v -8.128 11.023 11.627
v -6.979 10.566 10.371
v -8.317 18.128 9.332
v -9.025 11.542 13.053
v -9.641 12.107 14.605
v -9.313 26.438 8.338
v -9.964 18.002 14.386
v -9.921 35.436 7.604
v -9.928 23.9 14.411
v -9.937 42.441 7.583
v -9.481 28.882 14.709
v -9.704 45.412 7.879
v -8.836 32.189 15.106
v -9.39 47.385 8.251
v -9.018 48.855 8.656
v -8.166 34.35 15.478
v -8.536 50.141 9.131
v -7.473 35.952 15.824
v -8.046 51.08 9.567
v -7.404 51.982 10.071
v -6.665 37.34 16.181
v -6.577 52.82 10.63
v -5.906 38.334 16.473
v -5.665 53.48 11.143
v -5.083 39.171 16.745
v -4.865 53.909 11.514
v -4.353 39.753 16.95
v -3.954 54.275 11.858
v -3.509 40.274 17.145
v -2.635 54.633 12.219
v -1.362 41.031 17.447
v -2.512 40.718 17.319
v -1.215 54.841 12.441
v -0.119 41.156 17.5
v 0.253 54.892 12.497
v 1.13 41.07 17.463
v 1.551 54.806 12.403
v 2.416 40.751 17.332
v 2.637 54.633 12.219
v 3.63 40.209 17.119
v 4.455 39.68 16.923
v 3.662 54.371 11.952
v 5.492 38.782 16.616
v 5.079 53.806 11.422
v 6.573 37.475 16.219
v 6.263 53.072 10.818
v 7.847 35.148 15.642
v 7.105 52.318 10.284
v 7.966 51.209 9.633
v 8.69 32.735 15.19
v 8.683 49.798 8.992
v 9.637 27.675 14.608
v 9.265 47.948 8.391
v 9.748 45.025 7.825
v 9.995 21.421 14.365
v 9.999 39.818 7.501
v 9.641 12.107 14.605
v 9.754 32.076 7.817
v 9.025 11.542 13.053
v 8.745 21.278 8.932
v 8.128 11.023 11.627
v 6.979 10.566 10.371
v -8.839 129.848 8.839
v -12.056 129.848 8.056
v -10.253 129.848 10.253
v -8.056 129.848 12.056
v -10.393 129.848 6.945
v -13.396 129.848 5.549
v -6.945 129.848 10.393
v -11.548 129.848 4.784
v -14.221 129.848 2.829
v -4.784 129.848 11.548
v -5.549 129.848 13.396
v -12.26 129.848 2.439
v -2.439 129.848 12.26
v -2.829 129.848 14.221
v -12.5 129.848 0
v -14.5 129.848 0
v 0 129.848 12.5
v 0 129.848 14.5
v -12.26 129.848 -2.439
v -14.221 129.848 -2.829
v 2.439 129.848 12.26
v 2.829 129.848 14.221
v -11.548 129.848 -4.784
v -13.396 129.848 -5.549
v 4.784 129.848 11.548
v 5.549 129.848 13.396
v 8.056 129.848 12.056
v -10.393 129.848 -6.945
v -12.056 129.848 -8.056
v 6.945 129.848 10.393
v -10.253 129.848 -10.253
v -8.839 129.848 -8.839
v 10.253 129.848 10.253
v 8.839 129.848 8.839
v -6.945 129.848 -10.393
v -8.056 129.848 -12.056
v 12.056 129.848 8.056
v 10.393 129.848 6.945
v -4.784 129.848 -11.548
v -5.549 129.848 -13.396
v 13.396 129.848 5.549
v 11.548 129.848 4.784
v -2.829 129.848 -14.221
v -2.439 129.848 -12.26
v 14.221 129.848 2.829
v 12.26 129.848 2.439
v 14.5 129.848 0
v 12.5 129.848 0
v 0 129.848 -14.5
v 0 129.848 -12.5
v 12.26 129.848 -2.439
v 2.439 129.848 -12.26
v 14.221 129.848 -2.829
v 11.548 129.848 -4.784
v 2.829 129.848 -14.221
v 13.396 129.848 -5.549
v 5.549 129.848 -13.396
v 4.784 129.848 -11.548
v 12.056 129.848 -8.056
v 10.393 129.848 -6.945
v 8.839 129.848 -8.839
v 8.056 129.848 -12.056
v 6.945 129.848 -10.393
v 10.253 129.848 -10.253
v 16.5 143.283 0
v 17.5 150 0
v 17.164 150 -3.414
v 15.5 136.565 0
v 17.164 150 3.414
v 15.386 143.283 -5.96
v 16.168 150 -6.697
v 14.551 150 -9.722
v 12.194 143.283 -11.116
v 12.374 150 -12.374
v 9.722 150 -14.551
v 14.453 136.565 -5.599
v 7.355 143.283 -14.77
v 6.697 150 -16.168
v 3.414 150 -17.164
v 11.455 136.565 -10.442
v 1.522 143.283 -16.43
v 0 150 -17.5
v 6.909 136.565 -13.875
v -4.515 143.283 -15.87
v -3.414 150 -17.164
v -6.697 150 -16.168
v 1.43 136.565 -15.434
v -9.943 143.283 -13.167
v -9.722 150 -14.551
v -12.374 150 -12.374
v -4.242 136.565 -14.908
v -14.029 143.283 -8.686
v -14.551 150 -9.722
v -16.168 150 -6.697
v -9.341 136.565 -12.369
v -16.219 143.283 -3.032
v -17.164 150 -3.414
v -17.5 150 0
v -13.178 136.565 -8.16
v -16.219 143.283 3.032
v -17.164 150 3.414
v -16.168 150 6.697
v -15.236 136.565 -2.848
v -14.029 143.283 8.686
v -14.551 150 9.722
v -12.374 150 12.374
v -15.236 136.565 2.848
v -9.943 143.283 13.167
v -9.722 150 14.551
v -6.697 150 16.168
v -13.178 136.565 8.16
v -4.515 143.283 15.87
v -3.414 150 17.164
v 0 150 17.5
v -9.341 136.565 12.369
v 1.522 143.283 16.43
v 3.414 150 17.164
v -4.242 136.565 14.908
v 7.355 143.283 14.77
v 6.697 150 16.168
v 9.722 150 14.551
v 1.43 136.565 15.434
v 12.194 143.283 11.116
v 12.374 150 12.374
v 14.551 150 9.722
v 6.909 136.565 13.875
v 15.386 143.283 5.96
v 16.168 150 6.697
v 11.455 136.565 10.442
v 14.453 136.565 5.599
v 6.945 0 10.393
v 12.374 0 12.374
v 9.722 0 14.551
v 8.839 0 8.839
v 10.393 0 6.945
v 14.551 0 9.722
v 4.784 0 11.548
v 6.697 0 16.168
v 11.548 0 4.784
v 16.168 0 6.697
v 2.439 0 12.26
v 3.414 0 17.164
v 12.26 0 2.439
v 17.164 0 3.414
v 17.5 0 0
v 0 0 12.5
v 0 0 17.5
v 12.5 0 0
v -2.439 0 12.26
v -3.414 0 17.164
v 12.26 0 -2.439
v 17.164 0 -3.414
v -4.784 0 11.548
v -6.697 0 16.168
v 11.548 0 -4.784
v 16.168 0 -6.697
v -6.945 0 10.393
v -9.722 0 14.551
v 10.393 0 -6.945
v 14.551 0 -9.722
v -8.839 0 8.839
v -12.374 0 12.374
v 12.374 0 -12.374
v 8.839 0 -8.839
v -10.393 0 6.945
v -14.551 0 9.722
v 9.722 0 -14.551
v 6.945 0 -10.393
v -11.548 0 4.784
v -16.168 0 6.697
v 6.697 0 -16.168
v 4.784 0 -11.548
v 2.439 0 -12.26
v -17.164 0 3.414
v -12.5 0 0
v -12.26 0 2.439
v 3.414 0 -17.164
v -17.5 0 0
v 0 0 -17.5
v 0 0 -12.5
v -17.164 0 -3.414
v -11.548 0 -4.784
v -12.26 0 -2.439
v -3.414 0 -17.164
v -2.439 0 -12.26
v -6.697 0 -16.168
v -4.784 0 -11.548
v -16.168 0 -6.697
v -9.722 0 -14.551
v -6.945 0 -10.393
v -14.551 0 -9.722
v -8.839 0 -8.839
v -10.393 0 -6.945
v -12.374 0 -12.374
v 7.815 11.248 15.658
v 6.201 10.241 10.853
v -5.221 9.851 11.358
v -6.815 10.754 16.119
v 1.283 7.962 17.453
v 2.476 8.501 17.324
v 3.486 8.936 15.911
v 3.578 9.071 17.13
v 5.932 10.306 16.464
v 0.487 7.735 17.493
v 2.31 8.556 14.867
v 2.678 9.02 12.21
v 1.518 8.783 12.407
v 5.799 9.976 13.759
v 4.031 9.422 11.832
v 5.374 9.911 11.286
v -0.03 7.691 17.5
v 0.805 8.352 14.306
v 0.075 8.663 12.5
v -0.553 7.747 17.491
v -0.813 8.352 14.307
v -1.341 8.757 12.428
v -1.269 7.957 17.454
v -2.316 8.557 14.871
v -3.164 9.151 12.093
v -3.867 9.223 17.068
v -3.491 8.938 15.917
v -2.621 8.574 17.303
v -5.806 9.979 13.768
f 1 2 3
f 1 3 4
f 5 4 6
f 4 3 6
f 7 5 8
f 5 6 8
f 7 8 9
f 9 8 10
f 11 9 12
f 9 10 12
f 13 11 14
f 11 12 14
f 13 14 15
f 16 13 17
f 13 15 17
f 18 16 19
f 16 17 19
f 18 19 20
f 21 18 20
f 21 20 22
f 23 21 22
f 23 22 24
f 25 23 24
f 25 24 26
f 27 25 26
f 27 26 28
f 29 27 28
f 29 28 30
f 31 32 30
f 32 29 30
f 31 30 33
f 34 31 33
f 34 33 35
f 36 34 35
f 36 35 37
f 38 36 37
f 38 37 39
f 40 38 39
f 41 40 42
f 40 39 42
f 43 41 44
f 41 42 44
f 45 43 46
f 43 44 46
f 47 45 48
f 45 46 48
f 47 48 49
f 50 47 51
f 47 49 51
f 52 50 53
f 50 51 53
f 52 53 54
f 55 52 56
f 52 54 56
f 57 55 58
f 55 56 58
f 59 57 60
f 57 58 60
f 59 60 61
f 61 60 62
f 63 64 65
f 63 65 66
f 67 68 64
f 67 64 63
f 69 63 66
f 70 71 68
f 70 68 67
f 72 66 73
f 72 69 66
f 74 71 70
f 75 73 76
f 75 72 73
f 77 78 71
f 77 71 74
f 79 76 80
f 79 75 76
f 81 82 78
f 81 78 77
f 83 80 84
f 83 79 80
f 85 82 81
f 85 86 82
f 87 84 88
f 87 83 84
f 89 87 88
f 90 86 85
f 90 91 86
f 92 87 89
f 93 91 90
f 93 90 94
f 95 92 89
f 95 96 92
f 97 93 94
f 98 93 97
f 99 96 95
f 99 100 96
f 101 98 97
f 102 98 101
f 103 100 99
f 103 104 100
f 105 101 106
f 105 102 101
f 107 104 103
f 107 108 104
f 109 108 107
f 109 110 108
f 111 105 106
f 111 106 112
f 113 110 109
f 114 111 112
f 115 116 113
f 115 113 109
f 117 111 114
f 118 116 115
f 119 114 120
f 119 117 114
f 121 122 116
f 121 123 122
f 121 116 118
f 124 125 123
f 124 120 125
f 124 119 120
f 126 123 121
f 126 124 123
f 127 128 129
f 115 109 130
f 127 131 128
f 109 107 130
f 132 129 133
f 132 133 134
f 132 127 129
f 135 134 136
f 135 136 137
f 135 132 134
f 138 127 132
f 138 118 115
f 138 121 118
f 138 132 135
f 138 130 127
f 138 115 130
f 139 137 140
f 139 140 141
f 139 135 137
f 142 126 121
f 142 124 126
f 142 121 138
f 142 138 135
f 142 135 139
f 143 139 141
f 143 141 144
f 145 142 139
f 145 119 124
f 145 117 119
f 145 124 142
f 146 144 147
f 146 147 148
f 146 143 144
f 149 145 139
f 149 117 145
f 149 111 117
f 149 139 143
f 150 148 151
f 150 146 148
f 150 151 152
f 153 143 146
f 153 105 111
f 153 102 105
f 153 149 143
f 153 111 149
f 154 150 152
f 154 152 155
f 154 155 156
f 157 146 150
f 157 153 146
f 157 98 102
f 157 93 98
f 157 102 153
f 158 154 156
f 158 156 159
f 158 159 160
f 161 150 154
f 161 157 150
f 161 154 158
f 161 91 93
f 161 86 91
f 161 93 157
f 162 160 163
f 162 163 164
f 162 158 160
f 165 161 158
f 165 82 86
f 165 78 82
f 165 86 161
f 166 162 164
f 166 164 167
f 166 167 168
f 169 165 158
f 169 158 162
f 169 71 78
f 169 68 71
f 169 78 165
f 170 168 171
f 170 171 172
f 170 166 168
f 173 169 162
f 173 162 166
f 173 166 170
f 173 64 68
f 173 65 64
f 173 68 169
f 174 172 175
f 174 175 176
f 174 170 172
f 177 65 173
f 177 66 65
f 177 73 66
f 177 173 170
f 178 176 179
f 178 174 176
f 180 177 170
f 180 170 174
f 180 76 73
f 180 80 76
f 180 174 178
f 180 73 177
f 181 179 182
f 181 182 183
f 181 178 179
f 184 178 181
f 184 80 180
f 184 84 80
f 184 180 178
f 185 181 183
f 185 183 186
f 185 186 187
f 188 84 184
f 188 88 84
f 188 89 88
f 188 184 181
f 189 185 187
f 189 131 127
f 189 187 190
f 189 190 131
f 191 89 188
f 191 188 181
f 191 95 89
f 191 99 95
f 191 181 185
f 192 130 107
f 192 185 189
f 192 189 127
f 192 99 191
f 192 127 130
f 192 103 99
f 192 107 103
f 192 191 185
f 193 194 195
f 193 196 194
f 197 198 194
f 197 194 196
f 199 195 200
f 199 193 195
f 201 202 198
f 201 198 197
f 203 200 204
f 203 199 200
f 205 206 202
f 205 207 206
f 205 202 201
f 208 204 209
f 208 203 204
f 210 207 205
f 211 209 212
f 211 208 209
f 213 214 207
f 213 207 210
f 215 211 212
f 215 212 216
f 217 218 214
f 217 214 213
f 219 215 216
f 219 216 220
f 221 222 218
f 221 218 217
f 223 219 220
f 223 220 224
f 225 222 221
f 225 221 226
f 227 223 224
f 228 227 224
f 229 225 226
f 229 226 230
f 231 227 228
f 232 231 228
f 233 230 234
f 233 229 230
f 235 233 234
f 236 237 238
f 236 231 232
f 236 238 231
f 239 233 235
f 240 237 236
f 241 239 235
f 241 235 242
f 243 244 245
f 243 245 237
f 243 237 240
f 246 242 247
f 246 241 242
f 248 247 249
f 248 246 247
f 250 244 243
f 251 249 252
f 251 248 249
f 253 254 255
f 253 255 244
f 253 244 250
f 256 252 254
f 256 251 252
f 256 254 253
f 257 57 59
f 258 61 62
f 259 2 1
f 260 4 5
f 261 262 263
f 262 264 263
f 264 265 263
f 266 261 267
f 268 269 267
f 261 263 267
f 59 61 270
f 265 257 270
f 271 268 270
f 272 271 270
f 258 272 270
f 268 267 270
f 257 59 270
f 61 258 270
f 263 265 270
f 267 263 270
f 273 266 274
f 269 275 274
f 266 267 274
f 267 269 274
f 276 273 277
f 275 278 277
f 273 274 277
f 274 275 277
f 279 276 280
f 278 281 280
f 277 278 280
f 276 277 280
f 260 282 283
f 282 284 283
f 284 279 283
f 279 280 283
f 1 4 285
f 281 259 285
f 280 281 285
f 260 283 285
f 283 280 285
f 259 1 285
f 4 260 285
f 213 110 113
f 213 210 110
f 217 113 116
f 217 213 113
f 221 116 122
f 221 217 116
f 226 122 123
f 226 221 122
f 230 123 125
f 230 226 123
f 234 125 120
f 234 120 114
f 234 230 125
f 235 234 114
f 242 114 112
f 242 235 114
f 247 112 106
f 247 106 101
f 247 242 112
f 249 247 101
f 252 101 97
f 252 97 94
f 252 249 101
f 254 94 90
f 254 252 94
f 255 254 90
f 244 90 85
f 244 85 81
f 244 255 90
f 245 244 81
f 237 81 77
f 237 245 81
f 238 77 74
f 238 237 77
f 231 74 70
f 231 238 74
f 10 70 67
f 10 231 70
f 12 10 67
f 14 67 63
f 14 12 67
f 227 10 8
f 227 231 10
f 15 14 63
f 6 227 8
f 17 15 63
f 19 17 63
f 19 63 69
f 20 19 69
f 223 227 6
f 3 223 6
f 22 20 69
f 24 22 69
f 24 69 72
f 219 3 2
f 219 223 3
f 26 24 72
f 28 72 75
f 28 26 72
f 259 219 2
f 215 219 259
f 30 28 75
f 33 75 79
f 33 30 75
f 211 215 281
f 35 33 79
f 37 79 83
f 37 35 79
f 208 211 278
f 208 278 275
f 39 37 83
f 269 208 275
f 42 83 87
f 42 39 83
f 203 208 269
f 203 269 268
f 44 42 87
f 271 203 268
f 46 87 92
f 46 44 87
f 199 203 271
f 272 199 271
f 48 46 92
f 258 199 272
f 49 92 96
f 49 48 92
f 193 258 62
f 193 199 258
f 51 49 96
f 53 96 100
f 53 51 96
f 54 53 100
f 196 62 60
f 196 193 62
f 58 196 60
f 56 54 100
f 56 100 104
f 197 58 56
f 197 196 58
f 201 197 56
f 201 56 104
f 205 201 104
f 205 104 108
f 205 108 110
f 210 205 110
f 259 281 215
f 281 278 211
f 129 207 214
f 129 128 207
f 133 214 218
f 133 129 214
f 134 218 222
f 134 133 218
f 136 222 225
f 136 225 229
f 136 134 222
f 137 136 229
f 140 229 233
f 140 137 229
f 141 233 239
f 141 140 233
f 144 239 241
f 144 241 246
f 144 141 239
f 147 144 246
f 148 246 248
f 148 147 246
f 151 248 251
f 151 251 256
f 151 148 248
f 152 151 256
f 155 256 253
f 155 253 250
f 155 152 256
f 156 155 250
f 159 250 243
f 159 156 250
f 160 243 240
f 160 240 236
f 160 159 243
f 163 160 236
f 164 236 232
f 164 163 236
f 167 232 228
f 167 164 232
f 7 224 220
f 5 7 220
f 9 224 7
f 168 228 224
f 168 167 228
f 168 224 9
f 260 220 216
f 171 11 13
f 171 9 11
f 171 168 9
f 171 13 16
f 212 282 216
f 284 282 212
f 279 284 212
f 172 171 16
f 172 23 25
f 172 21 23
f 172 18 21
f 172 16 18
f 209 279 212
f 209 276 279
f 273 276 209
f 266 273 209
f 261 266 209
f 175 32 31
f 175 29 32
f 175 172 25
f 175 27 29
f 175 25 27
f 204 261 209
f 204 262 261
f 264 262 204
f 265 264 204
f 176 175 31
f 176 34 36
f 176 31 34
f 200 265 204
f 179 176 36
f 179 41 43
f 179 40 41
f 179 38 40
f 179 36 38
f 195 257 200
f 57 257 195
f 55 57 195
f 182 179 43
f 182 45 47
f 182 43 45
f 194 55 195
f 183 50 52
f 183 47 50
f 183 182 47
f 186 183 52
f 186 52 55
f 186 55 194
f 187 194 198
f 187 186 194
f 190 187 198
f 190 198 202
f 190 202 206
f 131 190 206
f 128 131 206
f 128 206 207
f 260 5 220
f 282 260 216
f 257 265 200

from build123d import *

# Parameters (mm, degrees)
F5_D     = 20
F5_DEPTH = 50
F5_TIP   = 6.0086061903


with BuildPart() as f1:
    # F0 (on Top) → F1 (revolve)
    with BuildSketch(Plane.XY):
        Polygon((12.5, 129.8480927944), (12.5, 0), (17.5, 0), (17.5, 60), (17.5, 150), (14.5, 129.8480927944), align=None)
    revolve(axis=Axis((0, 75, 0), (0, 1, 0)))

    # F5 (one way)
    with BuildSketch(Plane(origin=(0, 52.9813332936, -19.2836282906), x_dir=(-1, 0, 0), z_dir=(0, 0.9396926208, -0.3420201433))):
        with Locations((0, 20.5212085995)):
            Circle(F5_D / 2)
    extrude(amount=-F5_DEPTH, mode=Mode.SUBTRACT)
    with Locations(Plane(origin=(0, 52.9813332936, -19.2836282906), x_dir=(-1, 0, 0), z_dir=(0, 0.9396926208, -0.3420201433))):
        with Locations((0, 20.5212085995)):
            with Locations((0, 0, -(F5_DEPTH + F5_TIP / 2))):  # 118° drill point
                Cone(0, F5_D / 2, F5_TIP, mode=Mode.SUBTRACT)


solid = f1.part
